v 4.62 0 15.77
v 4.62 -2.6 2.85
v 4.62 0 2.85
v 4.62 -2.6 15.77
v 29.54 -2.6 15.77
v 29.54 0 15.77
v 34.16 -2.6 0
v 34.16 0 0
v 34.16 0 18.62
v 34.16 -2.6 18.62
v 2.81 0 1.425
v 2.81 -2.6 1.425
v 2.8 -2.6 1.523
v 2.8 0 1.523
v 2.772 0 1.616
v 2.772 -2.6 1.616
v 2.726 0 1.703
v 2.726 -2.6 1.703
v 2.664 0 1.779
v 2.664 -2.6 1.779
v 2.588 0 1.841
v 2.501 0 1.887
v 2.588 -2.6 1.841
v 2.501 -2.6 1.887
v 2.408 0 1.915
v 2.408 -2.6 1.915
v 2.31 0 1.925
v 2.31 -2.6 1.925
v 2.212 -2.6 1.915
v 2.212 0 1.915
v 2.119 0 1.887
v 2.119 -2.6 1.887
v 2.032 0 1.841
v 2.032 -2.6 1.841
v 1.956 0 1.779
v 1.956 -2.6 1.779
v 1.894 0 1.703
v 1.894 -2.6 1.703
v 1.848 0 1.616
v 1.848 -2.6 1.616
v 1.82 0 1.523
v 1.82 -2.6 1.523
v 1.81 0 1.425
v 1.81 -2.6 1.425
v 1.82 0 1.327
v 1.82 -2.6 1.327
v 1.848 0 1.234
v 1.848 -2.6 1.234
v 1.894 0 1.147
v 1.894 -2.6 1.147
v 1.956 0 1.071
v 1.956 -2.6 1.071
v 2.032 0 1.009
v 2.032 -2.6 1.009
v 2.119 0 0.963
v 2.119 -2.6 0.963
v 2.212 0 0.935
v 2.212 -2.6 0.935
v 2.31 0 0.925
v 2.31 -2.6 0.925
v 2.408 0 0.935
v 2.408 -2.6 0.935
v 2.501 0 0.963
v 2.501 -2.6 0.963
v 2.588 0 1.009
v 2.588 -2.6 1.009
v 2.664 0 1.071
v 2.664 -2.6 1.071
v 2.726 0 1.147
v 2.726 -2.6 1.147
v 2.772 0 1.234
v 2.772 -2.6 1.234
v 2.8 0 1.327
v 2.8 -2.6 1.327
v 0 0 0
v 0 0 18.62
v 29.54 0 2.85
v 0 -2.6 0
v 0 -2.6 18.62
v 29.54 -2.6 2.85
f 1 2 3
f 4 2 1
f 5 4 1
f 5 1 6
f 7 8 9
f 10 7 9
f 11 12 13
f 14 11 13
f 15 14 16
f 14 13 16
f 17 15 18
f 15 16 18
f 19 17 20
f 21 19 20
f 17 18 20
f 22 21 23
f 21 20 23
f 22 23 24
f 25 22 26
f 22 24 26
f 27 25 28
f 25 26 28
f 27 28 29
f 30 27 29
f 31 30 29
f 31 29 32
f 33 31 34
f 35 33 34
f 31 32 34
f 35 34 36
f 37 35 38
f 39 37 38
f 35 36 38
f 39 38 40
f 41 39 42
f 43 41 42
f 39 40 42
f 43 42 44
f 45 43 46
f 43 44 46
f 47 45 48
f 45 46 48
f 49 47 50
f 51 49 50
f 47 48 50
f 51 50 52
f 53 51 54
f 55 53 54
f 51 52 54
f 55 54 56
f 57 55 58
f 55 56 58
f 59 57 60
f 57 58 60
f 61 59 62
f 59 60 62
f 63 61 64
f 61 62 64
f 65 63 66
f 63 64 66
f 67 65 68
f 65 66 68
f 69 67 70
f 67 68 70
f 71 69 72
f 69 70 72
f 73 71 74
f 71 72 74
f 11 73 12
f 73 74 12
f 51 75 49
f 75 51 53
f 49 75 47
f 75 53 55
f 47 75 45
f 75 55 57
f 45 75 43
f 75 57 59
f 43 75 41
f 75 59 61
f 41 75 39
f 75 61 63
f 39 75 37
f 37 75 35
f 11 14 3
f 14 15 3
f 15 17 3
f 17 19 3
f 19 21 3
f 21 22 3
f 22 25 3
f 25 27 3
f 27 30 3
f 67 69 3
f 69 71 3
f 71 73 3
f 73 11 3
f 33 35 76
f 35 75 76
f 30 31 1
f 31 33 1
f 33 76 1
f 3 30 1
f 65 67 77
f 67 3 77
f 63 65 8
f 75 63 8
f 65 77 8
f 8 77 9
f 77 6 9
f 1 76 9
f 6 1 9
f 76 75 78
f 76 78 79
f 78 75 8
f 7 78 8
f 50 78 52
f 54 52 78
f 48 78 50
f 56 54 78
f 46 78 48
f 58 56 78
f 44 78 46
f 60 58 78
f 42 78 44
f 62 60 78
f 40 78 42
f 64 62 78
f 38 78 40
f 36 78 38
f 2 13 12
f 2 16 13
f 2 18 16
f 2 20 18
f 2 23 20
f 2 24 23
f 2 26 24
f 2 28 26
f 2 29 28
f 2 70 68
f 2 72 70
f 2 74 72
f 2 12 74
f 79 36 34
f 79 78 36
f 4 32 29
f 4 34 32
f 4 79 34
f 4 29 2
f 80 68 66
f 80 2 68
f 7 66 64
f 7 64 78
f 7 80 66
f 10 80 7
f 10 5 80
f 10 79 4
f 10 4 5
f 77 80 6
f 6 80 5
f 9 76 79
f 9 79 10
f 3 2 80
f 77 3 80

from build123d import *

# Parameters (mm, degrees)
SKETCH_W     = 34.16
SKETCH_H     = 18.62
PAD_DEPTH    = 2.6
SKETCH002_R  = 0.5
SKETCH002_W  = 24.92
SKETCH002_H  = 12.92
POCKET_DEPTH = 2.6


with BuildPart() as part:
    # Sketch → Pad (new body)
    with BuildSketch(Plane.XZ):
        with Locations((17.08, 9.31)):
            Rectangle(SKETCH_W, SKETCH_H)
    extrude(amount=PAD_DEPTH)

    # Sketch002 (on Face6 of Pad) → Pocket (cut)
    with BuildSketch(Plane.XZ.offset(2.6)):
        with Locations((2.31, 1.425)):
            Circle(SKETCH002_R)
        with Locations((17.08, 9.31)):
            Rectangle(SKETCH002_W, SKETCH002_H)
    extrude(amount=-POCKET_DEPTH, mode=Mode.SUBTRACT)


solid = part.part
